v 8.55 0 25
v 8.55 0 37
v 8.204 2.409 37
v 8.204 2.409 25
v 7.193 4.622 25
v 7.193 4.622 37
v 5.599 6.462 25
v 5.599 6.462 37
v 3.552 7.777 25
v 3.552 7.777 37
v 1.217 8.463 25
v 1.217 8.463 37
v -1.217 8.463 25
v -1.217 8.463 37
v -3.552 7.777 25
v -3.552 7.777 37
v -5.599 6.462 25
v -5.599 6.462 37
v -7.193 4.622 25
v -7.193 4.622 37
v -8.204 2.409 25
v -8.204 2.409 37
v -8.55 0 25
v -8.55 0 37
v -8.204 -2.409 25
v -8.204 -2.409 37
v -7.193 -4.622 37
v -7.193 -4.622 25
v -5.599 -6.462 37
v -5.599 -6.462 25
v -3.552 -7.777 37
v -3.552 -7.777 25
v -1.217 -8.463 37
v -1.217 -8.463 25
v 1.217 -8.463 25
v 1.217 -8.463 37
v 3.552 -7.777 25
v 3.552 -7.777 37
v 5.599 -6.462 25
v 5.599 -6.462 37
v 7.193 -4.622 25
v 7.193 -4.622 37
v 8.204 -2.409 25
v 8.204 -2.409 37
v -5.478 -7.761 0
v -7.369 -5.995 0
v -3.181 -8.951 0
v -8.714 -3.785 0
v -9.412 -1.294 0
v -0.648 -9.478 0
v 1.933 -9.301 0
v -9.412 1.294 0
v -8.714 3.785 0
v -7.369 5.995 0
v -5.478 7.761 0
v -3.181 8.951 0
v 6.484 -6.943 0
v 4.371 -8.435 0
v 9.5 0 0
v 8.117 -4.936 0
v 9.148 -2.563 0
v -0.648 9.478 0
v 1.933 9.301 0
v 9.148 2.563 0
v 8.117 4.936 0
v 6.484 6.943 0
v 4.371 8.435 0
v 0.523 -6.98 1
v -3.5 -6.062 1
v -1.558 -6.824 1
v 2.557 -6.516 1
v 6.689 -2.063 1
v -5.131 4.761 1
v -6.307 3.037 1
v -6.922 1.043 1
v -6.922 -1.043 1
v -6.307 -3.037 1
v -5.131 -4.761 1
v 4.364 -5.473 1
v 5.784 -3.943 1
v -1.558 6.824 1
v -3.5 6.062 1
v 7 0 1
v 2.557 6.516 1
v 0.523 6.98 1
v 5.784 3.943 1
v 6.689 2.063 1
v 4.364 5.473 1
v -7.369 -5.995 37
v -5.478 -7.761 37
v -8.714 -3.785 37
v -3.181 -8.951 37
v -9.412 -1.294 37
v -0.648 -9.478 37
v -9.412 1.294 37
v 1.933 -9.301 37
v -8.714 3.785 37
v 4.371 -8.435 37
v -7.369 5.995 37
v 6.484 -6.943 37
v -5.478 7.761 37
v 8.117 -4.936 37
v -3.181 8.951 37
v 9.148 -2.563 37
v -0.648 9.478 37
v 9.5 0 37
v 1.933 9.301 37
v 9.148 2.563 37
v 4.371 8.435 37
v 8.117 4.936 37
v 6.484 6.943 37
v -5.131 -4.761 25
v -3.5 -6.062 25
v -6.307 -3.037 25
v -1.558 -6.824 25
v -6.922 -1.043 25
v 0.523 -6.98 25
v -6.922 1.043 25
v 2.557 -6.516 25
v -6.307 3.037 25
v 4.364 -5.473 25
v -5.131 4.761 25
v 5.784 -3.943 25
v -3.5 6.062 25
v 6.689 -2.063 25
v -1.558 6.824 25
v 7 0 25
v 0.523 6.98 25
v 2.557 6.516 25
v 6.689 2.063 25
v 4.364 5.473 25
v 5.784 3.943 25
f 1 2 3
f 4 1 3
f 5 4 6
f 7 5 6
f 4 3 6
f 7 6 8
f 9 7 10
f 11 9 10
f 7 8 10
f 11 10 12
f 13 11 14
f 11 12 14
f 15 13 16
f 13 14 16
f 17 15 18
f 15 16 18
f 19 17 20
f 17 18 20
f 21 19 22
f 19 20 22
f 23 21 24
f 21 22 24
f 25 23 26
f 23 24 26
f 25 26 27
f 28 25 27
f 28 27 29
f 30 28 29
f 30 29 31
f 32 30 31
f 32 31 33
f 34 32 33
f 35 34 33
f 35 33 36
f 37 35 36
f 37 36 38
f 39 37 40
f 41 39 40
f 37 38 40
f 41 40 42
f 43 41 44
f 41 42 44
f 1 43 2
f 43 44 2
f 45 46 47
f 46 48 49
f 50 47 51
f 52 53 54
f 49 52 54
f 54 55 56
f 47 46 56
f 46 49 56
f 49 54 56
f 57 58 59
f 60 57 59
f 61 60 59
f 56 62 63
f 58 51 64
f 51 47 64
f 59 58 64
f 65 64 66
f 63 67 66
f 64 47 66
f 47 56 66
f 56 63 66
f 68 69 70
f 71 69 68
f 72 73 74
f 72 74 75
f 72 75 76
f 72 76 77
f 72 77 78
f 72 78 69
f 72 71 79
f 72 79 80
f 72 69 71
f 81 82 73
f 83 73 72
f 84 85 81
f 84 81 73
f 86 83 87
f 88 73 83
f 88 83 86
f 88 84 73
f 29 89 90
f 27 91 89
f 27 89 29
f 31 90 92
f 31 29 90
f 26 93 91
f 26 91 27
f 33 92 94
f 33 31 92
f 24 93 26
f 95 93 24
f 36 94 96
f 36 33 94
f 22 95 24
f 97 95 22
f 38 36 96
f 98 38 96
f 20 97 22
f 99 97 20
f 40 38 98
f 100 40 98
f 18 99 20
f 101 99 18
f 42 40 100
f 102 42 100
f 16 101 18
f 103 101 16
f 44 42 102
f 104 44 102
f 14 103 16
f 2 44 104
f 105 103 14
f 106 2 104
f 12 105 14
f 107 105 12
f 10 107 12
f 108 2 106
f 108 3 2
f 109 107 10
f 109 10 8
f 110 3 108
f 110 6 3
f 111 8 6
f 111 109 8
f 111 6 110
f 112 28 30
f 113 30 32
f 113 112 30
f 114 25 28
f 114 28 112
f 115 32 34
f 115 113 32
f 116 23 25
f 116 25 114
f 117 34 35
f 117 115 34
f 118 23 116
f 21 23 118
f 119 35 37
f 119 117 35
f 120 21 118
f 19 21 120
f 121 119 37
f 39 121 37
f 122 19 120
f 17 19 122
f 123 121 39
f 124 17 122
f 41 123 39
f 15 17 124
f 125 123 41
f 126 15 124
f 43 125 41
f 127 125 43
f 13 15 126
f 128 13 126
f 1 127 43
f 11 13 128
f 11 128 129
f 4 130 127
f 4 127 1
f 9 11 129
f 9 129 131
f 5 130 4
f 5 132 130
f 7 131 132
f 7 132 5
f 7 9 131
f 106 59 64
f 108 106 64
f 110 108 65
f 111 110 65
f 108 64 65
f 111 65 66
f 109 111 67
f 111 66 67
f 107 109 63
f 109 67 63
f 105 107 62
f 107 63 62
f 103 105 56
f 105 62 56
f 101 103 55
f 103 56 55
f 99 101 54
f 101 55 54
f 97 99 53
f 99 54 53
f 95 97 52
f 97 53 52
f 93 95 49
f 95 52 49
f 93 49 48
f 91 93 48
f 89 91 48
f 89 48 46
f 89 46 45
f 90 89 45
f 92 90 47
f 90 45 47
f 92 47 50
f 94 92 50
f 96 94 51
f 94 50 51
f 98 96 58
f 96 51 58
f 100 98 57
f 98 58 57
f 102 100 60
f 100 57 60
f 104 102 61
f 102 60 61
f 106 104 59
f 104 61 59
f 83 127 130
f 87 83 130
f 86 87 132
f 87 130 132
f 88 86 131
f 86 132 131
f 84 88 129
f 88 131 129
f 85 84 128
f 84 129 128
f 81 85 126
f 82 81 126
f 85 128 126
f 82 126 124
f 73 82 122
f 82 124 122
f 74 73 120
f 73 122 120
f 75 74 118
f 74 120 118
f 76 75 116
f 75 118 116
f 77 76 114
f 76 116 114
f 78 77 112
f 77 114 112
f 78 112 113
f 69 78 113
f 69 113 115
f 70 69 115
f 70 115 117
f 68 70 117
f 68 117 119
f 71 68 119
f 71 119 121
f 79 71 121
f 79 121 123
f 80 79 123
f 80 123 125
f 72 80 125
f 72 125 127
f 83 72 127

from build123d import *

# Parameters (mm, degrees)
F0_R     = 9.5
F1_DEPTH = 37
F2_R     = 7
F3_DEPTH = 36
F2_R_2   = 8.55
F4_DEPTH = 12


with BuildPart() as f1:
    # F0 (on Top) → F1 (new body)
    with BuildSketch(Plane.XY):
        Circle(F0_R)
    extrude(amount=F1_DEPTH)

    # F2 (on face) → F3 (cut)
    with BuildSketch(Plane.XY.offset(37)):
        Circle(F2_R)
    extrude(amount=-F3_DEPTH, mode=Mode.SUBTRACT)

    # F2 (on face) → F4 (cut)
    with BuildSketch(Plane.XY.offset(37)):
        Circle(F2_R_2)
        Circle(F2_R, mode=Mode.SUBTRACT)
    extrude(amount=-F4_DEPTH, mode=Mode.SUBTRACT)


solid = f1.part
